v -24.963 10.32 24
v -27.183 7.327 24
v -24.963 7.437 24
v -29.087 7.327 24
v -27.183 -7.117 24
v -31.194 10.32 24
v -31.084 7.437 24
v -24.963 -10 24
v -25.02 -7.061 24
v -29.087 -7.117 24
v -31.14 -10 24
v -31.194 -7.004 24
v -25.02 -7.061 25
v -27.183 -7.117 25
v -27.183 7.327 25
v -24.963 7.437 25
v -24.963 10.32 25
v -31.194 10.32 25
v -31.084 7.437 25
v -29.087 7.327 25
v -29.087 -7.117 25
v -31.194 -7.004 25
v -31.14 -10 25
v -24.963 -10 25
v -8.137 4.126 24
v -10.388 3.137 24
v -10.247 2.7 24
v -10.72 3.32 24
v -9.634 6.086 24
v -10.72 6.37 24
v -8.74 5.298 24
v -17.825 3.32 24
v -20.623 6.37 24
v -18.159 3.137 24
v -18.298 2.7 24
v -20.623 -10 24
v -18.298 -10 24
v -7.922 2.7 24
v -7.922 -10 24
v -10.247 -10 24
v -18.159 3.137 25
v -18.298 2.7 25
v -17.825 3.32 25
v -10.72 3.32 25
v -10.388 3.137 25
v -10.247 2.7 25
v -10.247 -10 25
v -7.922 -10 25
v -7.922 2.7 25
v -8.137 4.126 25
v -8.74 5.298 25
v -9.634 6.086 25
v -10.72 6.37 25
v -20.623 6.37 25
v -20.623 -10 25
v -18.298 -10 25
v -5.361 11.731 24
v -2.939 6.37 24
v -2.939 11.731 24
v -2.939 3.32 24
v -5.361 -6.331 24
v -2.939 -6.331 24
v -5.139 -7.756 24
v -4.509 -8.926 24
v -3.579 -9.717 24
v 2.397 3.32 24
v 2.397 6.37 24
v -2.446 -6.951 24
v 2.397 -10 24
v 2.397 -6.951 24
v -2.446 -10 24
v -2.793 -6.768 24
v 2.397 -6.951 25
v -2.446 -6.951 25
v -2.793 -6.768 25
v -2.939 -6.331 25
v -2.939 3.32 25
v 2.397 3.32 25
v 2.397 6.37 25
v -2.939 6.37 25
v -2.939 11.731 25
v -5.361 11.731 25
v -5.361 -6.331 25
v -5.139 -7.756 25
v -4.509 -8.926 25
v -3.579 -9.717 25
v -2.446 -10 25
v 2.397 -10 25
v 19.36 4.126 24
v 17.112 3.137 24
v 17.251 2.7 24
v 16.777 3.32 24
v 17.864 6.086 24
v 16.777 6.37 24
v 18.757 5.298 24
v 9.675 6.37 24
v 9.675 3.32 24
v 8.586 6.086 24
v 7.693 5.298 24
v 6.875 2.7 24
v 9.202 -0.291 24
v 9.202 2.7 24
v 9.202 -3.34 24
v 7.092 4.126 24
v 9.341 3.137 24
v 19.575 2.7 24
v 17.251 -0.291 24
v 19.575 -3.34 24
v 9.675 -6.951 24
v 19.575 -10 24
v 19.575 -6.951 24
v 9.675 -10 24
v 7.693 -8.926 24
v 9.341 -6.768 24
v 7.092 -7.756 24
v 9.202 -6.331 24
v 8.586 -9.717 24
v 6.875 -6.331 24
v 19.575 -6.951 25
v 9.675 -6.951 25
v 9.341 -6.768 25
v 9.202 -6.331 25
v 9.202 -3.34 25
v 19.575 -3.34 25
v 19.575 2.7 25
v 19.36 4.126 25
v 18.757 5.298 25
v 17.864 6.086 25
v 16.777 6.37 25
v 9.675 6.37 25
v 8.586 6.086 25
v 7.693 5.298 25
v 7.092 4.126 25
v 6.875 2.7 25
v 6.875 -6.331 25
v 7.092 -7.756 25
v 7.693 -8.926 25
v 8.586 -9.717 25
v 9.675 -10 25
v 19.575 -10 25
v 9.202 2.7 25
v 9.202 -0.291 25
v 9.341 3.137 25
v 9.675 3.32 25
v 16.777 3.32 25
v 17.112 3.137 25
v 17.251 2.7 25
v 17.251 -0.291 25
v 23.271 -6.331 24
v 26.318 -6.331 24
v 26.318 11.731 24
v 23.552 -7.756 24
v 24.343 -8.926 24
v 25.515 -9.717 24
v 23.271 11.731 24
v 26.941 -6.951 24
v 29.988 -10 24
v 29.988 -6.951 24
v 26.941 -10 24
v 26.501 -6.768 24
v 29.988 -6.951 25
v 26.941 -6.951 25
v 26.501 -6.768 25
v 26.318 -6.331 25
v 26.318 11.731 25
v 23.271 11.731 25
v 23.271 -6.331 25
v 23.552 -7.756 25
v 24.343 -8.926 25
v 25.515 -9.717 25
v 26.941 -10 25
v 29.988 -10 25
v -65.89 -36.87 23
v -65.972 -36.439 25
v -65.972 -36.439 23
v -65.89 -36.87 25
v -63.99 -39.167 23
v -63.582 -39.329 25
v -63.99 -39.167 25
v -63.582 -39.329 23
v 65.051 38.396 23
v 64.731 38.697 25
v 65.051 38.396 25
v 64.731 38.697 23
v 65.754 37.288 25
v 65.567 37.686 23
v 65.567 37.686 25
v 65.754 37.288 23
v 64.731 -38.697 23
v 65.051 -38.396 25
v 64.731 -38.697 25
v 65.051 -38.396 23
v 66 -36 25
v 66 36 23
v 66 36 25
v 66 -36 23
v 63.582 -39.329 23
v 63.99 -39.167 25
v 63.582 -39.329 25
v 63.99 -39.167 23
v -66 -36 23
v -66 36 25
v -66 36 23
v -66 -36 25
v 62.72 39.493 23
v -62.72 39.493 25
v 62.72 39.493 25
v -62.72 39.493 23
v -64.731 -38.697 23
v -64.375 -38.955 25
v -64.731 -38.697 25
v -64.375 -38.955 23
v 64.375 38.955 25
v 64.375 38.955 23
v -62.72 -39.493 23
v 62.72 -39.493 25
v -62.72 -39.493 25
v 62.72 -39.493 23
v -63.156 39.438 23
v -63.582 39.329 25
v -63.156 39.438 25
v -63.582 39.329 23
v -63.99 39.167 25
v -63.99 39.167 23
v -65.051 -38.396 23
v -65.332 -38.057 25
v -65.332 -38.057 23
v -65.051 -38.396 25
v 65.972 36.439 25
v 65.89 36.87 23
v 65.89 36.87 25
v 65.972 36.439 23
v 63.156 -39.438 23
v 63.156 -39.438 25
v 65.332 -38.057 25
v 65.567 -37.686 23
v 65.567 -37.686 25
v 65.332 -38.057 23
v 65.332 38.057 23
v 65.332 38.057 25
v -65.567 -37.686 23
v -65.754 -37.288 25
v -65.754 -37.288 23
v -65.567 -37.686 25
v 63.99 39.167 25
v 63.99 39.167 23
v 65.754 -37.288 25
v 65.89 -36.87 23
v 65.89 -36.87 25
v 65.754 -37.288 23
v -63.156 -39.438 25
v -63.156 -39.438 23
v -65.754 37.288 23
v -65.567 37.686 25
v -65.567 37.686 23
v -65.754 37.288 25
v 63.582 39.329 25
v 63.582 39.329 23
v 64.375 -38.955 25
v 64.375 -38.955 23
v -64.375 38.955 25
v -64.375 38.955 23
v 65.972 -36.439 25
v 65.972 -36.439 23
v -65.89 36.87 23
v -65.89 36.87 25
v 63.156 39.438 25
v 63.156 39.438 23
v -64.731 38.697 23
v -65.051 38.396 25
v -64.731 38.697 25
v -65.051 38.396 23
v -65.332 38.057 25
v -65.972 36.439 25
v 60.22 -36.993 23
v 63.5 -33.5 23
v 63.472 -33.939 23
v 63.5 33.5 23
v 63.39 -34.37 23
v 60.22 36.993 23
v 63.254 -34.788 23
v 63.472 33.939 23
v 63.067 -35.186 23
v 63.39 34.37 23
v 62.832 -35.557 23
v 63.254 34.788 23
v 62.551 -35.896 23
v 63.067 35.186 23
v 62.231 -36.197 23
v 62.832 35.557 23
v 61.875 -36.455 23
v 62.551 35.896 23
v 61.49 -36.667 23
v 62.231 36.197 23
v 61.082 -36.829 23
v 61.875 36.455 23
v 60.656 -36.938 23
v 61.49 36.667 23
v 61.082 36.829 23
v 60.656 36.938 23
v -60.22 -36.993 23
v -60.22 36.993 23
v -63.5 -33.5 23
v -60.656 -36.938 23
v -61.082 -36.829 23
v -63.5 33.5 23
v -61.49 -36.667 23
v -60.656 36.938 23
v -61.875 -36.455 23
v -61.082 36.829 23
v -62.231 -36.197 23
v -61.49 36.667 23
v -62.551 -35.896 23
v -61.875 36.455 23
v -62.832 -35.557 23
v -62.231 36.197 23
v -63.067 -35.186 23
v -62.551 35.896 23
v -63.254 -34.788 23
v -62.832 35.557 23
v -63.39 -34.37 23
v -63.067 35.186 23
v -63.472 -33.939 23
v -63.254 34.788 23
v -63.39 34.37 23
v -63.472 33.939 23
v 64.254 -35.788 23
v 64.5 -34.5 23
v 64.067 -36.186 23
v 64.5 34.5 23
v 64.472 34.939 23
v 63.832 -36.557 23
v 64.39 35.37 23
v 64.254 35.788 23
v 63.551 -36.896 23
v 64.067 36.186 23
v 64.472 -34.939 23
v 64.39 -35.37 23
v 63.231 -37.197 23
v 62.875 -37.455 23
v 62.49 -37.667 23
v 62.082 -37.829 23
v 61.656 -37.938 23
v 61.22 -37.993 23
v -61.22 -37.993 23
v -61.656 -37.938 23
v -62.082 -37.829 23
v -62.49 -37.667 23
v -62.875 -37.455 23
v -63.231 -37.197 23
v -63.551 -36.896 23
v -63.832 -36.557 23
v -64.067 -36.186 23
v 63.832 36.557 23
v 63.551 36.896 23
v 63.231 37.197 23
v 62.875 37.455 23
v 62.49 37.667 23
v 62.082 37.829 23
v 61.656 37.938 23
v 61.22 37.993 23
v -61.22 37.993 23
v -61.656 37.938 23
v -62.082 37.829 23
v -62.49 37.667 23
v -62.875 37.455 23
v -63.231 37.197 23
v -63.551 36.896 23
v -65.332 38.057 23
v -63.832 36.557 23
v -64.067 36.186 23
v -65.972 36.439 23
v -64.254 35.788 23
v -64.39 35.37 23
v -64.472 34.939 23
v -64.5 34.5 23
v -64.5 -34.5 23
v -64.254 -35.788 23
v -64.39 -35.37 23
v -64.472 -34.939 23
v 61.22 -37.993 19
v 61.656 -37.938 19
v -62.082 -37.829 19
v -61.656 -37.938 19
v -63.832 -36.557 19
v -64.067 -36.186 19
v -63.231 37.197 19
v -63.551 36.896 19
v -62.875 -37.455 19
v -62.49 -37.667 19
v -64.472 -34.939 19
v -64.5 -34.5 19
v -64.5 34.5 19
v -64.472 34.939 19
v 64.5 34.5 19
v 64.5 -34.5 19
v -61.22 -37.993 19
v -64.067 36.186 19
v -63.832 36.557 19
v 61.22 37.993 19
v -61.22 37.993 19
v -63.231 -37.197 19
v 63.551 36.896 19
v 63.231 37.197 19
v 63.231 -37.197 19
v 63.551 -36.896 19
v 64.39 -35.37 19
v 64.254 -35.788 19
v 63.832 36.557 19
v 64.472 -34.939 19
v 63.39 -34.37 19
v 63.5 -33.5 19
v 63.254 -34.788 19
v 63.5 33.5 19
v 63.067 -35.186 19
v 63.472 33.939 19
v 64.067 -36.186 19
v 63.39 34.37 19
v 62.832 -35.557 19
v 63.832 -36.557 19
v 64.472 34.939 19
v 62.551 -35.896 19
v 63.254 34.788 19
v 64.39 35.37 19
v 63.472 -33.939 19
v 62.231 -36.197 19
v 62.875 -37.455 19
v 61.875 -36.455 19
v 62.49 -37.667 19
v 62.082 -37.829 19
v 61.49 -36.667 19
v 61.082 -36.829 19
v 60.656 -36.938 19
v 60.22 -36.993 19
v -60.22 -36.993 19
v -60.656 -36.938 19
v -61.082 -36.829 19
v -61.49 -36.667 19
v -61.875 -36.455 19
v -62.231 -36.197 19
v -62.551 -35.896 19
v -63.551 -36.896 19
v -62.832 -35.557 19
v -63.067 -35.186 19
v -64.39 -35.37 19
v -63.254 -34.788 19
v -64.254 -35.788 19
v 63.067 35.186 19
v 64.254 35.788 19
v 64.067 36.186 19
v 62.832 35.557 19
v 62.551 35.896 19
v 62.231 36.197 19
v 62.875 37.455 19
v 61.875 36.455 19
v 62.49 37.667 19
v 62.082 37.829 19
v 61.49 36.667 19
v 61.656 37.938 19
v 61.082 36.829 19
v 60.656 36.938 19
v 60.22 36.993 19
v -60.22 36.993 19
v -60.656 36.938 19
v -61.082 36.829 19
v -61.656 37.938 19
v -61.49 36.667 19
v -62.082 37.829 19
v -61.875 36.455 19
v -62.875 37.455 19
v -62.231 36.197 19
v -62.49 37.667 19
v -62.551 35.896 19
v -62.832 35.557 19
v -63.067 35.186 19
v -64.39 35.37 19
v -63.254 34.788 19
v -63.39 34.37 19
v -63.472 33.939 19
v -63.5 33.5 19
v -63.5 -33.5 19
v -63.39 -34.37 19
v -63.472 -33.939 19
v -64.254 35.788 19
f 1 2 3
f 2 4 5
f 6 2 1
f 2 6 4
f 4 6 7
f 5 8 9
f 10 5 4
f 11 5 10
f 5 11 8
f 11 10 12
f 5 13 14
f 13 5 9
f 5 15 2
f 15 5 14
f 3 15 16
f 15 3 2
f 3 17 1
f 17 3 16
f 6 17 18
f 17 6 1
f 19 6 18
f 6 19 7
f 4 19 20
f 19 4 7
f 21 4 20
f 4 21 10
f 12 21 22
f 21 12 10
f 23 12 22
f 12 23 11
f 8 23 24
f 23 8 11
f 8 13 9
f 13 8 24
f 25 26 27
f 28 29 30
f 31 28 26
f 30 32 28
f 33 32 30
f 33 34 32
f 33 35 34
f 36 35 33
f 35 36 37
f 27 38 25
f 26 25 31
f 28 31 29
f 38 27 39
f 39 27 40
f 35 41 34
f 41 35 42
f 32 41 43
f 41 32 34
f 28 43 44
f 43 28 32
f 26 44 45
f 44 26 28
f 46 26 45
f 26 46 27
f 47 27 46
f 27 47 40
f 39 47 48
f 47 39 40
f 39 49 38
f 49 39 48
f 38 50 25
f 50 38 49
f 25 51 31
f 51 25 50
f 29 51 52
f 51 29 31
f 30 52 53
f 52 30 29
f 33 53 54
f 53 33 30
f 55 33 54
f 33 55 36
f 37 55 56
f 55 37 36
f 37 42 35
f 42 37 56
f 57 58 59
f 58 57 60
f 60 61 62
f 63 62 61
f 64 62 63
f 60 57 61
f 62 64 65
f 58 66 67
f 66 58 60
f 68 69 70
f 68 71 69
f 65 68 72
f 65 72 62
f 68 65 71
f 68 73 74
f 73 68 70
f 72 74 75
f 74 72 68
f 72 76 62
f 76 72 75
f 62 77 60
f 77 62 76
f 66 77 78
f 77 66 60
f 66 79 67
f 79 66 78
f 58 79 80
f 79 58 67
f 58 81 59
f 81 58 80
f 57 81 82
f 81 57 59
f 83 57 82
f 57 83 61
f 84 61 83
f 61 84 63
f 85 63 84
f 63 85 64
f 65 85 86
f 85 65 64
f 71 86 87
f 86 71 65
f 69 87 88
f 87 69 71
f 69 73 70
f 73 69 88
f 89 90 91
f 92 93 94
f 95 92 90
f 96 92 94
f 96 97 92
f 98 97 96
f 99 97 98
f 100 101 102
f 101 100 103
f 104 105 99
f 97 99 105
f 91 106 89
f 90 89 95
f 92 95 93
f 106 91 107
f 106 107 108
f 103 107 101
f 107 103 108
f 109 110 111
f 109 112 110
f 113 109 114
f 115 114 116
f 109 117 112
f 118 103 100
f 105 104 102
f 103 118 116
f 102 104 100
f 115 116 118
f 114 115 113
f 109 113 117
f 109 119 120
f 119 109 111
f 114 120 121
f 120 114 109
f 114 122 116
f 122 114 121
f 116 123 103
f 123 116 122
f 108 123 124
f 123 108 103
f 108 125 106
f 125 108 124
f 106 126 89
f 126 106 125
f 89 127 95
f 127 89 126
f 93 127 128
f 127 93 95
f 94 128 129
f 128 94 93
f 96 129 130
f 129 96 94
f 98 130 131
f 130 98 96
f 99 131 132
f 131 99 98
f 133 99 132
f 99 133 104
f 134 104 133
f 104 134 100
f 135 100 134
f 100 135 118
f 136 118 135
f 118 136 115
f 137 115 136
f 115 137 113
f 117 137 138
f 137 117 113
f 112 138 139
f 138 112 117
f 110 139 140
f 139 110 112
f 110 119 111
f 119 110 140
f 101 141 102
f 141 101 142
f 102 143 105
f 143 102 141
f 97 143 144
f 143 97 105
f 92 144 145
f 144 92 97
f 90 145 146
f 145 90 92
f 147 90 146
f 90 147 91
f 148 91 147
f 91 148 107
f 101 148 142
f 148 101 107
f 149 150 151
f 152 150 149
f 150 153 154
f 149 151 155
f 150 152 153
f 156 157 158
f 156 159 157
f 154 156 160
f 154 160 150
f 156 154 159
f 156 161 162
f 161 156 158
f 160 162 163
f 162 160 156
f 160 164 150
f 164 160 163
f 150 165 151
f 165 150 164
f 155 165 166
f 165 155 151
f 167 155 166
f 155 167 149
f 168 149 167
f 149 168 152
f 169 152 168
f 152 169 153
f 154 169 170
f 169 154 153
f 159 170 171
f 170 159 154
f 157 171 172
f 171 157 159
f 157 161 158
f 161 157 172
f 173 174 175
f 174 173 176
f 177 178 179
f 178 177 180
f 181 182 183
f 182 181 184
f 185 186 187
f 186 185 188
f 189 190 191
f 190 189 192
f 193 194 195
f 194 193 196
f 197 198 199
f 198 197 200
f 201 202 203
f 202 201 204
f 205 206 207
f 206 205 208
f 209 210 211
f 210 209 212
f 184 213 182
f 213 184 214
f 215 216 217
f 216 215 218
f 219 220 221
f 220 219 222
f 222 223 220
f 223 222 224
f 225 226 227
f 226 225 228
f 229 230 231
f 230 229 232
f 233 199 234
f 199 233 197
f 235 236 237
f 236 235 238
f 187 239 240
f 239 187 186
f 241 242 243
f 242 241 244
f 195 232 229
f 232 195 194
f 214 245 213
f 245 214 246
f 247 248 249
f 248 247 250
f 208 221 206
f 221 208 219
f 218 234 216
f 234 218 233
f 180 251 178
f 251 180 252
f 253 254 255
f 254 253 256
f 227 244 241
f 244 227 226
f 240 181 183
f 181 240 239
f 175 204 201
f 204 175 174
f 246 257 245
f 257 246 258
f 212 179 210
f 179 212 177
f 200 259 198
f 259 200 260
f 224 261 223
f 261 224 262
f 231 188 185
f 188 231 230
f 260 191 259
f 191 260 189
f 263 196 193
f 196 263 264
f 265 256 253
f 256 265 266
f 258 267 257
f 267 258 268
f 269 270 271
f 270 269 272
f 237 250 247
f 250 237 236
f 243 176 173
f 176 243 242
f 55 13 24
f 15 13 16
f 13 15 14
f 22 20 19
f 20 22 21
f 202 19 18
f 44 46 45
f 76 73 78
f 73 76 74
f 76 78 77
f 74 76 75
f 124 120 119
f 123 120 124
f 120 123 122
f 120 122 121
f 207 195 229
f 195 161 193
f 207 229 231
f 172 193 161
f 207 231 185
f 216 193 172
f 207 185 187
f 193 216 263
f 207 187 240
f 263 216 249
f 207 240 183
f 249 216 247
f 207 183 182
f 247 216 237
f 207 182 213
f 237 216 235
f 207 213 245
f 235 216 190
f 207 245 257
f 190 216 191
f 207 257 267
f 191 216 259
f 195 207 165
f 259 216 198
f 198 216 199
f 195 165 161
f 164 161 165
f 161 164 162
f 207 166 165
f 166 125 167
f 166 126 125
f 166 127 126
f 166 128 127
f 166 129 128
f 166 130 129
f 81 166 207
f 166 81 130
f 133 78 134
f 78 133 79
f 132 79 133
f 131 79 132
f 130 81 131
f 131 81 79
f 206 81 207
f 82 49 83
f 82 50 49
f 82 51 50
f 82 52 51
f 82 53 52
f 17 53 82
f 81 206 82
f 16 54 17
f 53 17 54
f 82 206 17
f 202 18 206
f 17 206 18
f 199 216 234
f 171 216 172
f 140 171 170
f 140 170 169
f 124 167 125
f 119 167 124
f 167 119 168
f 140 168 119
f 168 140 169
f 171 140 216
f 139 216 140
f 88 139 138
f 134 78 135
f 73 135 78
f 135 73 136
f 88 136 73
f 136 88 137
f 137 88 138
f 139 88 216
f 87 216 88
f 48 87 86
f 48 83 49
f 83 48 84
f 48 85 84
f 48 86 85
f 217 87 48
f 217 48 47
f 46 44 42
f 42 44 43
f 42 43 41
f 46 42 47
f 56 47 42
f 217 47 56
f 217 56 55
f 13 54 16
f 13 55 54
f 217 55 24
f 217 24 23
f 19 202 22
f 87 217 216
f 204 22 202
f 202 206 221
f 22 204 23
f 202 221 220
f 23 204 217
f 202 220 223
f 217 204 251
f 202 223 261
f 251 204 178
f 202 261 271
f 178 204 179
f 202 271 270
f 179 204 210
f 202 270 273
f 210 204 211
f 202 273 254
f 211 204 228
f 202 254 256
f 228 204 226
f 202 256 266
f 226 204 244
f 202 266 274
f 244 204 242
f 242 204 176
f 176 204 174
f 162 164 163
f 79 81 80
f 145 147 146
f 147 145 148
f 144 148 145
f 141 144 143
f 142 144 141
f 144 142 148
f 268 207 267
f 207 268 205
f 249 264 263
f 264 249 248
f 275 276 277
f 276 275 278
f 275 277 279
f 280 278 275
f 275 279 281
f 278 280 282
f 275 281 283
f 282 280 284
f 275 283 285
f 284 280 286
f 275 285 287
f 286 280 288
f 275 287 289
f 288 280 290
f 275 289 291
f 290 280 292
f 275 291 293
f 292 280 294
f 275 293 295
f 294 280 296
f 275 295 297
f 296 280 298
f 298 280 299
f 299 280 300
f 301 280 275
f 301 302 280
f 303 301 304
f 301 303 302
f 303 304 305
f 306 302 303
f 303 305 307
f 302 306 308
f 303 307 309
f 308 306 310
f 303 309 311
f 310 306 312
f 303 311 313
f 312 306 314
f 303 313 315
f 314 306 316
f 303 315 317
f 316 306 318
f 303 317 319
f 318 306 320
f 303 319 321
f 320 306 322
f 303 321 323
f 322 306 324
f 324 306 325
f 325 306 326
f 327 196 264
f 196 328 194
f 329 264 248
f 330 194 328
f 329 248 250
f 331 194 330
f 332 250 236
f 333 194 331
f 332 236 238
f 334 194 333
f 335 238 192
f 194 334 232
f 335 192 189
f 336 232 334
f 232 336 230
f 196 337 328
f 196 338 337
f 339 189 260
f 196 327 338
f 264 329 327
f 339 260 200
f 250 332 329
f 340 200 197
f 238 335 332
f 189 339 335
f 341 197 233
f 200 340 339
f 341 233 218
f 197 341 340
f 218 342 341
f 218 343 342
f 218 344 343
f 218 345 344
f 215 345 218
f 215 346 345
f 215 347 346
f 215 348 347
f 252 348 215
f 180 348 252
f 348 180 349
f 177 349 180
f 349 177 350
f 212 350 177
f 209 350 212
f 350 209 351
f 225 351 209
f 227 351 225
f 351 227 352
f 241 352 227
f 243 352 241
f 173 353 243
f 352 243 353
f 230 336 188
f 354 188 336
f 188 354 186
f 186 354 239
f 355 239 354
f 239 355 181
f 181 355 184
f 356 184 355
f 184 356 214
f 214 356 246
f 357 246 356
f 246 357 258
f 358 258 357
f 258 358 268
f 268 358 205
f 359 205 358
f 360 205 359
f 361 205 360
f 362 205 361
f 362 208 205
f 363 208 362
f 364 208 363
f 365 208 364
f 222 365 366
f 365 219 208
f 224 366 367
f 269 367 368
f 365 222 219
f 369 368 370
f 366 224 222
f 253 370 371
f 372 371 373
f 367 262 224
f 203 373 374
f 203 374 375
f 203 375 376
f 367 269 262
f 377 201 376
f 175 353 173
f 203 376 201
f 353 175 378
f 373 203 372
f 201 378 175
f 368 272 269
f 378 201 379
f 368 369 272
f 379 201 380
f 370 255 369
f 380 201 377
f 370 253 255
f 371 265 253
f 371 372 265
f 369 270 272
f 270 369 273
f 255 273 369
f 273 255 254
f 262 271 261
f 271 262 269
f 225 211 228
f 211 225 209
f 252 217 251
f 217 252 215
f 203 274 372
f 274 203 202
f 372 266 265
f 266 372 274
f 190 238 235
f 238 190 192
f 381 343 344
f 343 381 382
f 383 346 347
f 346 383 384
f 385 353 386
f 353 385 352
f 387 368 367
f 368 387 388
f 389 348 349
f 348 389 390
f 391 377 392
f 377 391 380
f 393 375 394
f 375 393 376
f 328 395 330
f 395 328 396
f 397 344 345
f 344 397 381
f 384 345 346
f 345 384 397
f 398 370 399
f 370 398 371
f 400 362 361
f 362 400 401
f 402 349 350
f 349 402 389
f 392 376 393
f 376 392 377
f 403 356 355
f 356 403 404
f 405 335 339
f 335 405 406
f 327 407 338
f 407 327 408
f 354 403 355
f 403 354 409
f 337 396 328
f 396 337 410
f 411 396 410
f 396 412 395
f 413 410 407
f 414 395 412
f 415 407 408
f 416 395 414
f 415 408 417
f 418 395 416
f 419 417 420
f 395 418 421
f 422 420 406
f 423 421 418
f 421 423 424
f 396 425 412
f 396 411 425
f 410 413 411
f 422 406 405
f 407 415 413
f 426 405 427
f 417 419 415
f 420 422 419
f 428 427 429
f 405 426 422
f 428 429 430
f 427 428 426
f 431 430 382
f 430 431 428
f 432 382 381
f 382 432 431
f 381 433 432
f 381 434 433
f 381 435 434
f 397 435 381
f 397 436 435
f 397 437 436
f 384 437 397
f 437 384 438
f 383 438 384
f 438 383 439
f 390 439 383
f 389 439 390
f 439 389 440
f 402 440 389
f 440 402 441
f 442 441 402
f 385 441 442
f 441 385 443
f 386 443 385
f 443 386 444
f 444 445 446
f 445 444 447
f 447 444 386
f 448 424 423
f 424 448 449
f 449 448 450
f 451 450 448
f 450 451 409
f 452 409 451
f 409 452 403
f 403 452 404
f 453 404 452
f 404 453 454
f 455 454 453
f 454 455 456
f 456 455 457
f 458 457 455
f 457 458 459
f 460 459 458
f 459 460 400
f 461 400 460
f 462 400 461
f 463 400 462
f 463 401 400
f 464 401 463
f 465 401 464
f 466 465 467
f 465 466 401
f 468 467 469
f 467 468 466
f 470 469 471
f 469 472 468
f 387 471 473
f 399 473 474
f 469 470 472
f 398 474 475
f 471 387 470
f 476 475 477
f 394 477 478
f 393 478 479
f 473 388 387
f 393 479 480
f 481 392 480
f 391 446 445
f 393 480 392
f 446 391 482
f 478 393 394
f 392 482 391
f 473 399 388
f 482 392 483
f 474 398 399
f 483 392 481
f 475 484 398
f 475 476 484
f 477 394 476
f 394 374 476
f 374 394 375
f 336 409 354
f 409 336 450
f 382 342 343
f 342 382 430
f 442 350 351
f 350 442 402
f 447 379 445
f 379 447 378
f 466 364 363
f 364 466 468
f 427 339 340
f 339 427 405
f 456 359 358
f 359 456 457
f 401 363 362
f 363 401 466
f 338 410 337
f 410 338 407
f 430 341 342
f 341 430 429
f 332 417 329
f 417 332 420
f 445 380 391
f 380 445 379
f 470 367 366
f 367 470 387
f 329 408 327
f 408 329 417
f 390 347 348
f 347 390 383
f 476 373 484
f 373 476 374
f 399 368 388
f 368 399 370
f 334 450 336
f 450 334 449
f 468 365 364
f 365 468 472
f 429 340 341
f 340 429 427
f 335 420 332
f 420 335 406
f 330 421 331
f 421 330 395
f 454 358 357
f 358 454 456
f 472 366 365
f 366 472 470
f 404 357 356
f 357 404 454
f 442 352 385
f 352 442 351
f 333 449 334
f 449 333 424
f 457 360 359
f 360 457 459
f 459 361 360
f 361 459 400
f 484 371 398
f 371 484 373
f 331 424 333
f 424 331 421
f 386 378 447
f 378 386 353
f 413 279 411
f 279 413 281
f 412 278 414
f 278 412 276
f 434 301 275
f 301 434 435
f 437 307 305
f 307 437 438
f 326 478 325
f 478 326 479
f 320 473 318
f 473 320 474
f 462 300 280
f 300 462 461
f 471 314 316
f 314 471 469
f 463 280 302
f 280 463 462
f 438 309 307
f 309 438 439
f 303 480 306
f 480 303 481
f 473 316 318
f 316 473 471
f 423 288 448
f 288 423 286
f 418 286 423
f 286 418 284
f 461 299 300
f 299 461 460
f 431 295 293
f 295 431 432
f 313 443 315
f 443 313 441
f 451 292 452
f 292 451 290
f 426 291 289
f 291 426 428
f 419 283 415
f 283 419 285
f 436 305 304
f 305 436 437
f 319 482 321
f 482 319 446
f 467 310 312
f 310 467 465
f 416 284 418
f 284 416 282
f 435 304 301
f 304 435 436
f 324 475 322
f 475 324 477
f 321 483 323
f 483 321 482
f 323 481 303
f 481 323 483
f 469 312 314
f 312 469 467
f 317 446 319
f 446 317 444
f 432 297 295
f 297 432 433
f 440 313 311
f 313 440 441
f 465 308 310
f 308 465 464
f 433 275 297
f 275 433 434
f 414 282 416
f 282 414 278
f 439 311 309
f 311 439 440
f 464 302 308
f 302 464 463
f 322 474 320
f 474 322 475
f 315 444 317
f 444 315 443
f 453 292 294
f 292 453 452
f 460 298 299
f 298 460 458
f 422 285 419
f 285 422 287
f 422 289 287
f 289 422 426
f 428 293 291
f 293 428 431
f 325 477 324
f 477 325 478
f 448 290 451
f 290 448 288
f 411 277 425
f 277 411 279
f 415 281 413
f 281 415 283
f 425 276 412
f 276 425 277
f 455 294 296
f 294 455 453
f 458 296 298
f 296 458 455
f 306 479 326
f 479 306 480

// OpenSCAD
use <Write.scad>

$fn=50;
wall = 3; 
PCB_l = 72;   		
PCB_w = 125; 
PCB_ofst_l = 1.5;
PCB_ofst_w = 1.5; 
Height = 15;	// 15
Cover_h = 3;
Top_Thickness = 2;
Post_Height = 10;
debug = 0; 

module POST(){
	difference(){	
		translate([0 ,0,-0.5])
		minkowski()												
		cylinder(r=2.5,h=Post_Height); 		// post
		cylinder(r=1.5,h=Post_Height+1);		// drill shaft / inner hole
	}
}

module ANT(){	
	translate([0 ,0,-4])
	rotate([-90,0,0])
	cylinder(r=2.5,h=wall); 
}

module POSTS(){
	offset_w = 5.5;
	offset_l = 4.5;
	h = -Post_Height;

	translate([PCB_w/2 - offset_w + PCB_ofst_w ,PCB_l/2 - offset_l - PCB_ofst_l,h])
	POST();

	translate([PCB_w/2 - offset_w + PCB_ofst_w,-(PCB_l/2) + offset_l - PCB_ofst_l,h])
	POST();

	translate([-PCB_w/2 + offset_w + PCB_ofst_w,PCB_l/2 - offset_l - PCB_ofst_l,h])
	POST();

	translate([-PCB_w/2 + offset_w + PCB_ofst_w,-(PCB_l/2) + offset_l - PCB_ofst_l,h])
	POST();
}

module USB(){
	translate([0,-(PCB_l+wall)/2 - PCB_ofst_l,7/2+0.5]) 
	cube([15,wall,7],center = true); 
}

module MUSB(){
	translate([18+PCB_ofst_w,-(PCB_l+wall)/2 - PCB_ofst_l,3/2+0.5]) 
	cube([8,wall,3],center = true); 
}

module RJ(){
	translate([43+PCB_ofst_w,-(PCB_l+wall)/2 - PCB_ofst_l,13/2+1]) 
	cube([16,wall,13],center = true); 
}

module PWR(){
	translate([(PCB_w+wall)/2+PCB_ofst_w,-PCB_ofst_l-6,11/2+0.5]) 
	cube([wall,9,11],center = true); 
}

module ANTS(){
	translate([-PCB_w/2+PCB_ofst_w+4 + 20,PCB_l/2+1.5,0]) 
	ANT();

	translate([-PCB_w/2+PCB_ofst_w+4 + 35,PCB_l/2+1.5,0]) 
	ANT();
}

module PCB(){
	translate([PCB_ofst_w,-PCB_ofst_l,0]) 
	cube([PCB_w,PCB_l,1],center = true); 
}

module IO(){
	USB();
	MUSB();
	RJ();
	PWR();
	ANTS();
}

module BOTTOM(){
	if (debug == 1){
		IO();
		PCB();
	}

	POSTS();

	margin = 3; // negative margin

	difference(){
		translate([-(PCB_w+wall-margin)/2,-(PCB_l+wall-margin)/2,-Post_Height-Top_Thickness])
		minkowski(){												//Body
 			cube([PCB_w+wall-margin,PCB_l+wall-margin,Height]);
 			cylinder(r=3.5,h=Height);
		}

		translate([-(PCB_w-margin)/2,-(PCB_l-margin)/2,-Post_Height-2])
		minkowski(){												// inner cavity
 			cube([PCB_w-margin,PCB_l-margin,Height+2]);
 			cylinder(r=3.5,h=Height+2);
		}	

		IO();
		PCB();
	}
}

module COVER(){
	wedge_h=2;		
	margin = 3; // negative margine

	// cover top section
	difference(){
		translate([-(PCB_w+wall-margin)/2,-(PCB_l+wall-margin)/2,23])
		minkowski(){												//Body
 			cube([PCB_w+wall-margin,PCB_l+wall-margin,1]);
 			cylinder(r=3.5,h=1);
		}

		translate([0,0,26])
		write("Intel",t=4,h=20,center=true, rotate=[180,180,180],font = "orbitron.dxf");
	}

	// cover wedge
	difference(){
		translate([-(PCB_w+wall-margin)/2+1.5,-(PCB_l+wall-margin)/2+1.5,19])
		minkowski(){												//Body
 			cube([PCB_w+wall-margin-3,PCB_l+wall-margin-3,wedge_h]);
 			cylinder(r=3.5,h=wedge_h);
		}

		translate([-(PCB_w-margin)/2+1,-(PCB_l-margin)/2+1,19])
		minkowski(){												//Inner cavity
 			cube([PCB_w-margin-2,PCB_l-margin-2,wedge_h]);
 			cylinder(r=3.5,h=wedge_h);
		}
	}
}

// BOTTOM();
COVER();
